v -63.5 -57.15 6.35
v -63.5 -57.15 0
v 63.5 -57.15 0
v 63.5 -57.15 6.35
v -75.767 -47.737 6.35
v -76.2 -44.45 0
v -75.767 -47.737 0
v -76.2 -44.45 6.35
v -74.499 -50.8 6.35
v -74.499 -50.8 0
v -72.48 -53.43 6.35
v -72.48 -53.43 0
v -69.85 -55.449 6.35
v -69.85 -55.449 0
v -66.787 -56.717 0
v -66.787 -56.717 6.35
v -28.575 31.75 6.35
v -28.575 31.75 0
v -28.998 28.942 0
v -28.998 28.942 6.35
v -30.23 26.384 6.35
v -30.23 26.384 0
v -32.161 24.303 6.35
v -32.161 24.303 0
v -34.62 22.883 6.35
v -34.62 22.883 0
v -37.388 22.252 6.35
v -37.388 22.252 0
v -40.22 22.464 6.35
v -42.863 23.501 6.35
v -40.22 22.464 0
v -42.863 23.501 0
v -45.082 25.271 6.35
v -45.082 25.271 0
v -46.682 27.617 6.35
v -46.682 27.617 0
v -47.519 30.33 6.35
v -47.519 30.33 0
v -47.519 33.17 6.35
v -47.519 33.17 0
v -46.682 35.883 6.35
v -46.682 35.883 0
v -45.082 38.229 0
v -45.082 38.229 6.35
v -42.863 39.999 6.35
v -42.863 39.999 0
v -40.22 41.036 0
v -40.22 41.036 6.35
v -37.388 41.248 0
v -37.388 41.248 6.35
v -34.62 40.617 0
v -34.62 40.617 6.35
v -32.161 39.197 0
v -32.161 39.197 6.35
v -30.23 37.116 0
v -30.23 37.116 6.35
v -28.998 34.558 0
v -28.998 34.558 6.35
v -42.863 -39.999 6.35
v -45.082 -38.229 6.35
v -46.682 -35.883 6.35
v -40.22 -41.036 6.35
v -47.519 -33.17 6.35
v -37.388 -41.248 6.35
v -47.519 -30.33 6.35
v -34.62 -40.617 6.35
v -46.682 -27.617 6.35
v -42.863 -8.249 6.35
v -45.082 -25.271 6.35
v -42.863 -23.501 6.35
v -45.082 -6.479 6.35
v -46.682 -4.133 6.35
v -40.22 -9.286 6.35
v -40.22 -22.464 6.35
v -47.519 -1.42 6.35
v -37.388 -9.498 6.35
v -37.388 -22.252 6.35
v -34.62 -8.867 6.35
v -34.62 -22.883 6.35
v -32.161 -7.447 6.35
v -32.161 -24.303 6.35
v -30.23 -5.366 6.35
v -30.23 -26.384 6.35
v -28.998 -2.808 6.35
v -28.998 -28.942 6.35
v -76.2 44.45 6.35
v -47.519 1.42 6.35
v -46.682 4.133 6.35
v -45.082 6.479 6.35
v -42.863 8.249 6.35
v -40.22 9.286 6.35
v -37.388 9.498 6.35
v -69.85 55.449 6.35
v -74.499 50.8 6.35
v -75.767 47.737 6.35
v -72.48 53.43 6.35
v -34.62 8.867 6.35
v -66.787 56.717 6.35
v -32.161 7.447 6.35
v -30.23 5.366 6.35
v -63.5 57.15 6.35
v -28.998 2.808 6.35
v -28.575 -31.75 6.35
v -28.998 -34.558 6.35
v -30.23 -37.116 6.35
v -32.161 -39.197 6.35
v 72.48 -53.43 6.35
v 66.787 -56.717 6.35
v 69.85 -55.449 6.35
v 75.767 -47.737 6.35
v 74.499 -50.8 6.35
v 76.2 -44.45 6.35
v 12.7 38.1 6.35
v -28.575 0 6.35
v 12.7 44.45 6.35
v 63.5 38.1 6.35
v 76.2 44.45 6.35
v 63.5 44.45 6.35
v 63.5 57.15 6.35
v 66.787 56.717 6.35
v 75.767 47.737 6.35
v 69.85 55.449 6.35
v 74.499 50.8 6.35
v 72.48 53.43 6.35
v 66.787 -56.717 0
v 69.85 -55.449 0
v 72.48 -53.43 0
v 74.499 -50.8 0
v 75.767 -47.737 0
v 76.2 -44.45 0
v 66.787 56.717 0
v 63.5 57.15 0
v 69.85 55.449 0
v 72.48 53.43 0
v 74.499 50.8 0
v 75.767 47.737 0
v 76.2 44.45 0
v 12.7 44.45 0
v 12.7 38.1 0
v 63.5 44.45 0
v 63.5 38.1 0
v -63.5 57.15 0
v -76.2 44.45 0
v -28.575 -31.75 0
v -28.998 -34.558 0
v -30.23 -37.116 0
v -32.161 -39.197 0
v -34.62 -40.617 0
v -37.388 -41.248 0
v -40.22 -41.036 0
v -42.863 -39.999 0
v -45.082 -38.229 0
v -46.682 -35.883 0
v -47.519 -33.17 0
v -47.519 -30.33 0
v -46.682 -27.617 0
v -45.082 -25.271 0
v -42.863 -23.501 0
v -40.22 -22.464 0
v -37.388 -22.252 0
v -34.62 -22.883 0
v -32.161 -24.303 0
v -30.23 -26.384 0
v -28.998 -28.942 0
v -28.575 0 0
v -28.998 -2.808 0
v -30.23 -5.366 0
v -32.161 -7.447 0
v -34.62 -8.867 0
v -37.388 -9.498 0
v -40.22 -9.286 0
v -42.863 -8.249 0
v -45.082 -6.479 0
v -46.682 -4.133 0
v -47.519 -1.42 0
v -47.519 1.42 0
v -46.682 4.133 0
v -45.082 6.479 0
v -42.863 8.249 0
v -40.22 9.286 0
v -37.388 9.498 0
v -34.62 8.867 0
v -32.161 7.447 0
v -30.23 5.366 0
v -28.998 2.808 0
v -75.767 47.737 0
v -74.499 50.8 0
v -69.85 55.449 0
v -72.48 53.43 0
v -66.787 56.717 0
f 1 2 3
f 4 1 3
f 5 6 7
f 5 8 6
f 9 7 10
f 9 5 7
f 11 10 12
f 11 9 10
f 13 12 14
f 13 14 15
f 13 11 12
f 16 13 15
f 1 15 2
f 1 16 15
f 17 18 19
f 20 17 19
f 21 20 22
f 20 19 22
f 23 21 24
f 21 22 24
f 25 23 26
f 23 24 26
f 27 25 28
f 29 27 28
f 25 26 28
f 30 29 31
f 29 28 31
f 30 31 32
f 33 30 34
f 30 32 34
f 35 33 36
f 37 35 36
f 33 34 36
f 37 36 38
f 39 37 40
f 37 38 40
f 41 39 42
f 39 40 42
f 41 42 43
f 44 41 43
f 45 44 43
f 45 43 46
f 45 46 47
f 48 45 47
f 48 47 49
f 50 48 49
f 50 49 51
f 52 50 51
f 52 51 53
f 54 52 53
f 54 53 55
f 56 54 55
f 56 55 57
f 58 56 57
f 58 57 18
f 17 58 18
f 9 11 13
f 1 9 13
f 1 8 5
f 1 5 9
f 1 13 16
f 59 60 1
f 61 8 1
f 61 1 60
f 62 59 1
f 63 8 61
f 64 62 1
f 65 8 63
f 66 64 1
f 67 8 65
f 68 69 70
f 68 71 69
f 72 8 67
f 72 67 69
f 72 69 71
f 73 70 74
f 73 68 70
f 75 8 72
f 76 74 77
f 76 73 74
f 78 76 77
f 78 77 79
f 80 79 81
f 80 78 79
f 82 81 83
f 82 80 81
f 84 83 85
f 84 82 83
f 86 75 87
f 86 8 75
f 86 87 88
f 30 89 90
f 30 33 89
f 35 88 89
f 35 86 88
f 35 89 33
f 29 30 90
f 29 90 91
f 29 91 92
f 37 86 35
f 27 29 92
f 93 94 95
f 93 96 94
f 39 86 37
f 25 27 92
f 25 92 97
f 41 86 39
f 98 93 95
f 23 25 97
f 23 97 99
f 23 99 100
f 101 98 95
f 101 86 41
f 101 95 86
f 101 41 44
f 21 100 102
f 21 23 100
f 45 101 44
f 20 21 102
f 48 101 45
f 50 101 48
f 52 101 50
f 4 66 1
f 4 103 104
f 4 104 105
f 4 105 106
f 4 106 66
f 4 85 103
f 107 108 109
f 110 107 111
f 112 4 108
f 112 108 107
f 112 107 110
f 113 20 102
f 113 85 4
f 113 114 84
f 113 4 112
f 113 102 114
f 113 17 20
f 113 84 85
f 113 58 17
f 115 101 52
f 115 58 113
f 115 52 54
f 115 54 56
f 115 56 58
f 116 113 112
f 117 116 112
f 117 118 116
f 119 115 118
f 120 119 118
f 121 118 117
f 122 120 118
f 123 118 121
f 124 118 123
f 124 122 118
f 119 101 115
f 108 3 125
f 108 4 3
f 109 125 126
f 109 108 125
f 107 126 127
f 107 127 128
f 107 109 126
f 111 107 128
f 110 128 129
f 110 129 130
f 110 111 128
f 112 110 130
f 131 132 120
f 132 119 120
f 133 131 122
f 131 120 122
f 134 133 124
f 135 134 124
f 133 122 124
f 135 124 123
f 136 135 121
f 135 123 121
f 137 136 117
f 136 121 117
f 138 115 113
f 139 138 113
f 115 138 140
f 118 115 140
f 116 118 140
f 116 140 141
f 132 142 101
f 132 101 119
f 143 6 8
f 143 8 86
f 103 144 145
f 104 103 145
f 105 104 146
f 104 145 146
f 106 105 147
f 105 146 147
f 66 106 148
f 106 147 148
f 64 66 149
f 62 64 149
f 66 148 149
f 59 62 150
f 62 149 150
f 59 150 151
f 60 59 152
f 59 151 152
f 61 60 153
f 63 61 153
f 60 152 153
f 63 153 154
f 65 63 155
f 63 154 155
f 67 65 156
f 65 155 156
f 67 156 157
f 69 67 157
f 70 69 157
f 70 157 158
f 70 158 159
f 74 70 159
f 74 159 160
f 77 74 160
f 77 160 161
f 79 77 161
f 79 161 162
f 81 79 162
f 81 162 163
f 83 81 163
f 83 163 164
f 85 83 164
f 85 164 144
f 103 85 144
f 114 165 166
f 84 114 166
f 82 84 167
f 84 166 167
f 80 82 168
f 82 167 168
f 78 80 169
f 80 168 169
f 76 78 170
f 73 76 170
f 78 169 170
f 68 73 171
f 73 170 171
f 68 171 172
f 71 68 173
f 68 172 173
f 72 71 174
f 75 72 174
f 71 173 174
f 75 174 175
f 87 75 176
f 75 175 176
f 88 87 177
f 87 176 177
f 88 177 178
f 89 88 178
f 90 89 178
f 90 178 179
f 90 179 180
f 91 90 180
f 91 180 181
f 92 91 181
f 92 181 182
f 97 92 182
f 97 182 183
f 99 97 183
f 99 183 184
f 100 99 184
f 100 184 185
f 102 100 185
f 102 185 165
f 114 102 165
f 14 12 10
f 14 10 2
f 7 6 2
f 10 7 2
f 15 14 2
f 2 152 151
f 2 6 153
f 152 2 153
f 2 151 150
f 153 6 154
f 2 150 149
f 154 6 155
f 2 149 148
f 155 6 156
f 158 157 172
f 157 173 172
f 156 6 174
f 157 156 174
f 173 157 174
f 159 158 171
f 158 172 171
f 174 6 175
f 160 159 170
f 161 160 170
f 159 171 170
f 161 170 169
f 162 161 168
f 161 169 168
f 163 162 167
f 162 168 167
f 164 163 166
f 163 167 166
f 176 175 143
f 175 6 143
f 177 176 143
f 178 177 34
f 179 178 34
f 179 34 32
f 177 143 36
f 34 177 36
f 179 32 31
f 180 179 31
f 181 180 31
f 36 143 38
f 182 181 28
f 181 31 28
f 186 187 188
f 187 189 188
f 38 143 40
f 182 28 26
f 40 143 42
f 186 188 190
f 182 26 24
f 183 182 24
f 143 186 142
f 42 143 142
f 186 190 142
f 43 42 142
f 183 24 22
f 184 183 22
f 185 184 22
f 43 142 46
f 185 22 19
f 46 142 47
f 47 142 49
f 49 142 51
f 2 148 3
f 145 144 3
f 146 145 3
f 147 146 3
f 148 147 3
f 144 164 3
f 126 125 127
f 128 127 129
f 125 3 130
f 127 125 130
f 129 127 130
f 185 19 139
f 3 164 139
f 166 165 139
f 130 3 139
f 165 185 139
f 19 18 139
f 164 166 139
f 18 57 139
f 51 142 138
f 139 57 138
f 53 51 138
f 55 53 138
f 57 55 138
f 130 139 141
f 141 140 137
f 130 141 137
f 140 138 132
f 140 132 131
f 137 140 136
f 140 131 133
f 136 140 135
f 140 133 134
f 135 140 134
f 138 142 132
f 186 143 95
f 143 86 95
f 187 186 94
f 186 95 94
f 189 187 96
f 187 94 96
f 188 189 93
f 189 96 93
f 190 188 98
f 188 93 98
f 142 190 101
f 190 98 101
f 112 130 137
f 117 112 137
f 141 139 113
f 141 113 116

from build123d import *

# Parameters (mm, degrees)
F0_W     = 152.4
F0_H     = 114.3
F1_DEPTH = 6.35
F2_R     = 9.525
F3_DEPTH = 25.4
F5_R     = 12.7
F6_W     = 50.8
F6_H     = 6.35
F7_DEPTH = 25.4


with BuildPart() as f1:
    # F0 (on Top) → F1 (new body)
    with BuildSketch(Plane.XY):
        Rectangle(F0_W, F0_H)
    extrude(amount=F1_DEPTH)

    # F2 (on face) → F3 (cut)
    with BuildSketch(Plane(origin=(0, 0, 0), x_dir=(1, 0, 0), z_dir=(0, 0, -1))):
        with Locations((-38.1, 0)):
            Circle(F2_R)
        with Locations((-38.1, 31.75)):
            Circle(F2_R)
        with Locations((-38.1, -31.75)):
            Circle(F2_R)
    extrude(amount=-F3_DEPTH, mode=Mode.SUBTRACT)

    # F5
    f5_edges = [f1.edges().sort_by_distance(p)[0] for p in [
        (-76.2, -57.15, 3.175),
        (-76.2, 57.15, 3.175),
        (76.2, 57.15, 3.175),
        (76.2, -57.15, 3.175),
    ]]
    fillet(f5_edges, radius=F5_R)

    # F6 (on face) → F7 (cut)
    with BuildSketch(Plane(origin=(0, 0, 0), x_dir=(1, 0, 0), z_dir=(0, 0, -1))):
        with Locations((38.1, -41.275)):
            Rectangle(F6_W, F6_H)
    extrude(amount=-F7_DEPTH, mode=Mode.SUBTRACT)


solid = f1.part
